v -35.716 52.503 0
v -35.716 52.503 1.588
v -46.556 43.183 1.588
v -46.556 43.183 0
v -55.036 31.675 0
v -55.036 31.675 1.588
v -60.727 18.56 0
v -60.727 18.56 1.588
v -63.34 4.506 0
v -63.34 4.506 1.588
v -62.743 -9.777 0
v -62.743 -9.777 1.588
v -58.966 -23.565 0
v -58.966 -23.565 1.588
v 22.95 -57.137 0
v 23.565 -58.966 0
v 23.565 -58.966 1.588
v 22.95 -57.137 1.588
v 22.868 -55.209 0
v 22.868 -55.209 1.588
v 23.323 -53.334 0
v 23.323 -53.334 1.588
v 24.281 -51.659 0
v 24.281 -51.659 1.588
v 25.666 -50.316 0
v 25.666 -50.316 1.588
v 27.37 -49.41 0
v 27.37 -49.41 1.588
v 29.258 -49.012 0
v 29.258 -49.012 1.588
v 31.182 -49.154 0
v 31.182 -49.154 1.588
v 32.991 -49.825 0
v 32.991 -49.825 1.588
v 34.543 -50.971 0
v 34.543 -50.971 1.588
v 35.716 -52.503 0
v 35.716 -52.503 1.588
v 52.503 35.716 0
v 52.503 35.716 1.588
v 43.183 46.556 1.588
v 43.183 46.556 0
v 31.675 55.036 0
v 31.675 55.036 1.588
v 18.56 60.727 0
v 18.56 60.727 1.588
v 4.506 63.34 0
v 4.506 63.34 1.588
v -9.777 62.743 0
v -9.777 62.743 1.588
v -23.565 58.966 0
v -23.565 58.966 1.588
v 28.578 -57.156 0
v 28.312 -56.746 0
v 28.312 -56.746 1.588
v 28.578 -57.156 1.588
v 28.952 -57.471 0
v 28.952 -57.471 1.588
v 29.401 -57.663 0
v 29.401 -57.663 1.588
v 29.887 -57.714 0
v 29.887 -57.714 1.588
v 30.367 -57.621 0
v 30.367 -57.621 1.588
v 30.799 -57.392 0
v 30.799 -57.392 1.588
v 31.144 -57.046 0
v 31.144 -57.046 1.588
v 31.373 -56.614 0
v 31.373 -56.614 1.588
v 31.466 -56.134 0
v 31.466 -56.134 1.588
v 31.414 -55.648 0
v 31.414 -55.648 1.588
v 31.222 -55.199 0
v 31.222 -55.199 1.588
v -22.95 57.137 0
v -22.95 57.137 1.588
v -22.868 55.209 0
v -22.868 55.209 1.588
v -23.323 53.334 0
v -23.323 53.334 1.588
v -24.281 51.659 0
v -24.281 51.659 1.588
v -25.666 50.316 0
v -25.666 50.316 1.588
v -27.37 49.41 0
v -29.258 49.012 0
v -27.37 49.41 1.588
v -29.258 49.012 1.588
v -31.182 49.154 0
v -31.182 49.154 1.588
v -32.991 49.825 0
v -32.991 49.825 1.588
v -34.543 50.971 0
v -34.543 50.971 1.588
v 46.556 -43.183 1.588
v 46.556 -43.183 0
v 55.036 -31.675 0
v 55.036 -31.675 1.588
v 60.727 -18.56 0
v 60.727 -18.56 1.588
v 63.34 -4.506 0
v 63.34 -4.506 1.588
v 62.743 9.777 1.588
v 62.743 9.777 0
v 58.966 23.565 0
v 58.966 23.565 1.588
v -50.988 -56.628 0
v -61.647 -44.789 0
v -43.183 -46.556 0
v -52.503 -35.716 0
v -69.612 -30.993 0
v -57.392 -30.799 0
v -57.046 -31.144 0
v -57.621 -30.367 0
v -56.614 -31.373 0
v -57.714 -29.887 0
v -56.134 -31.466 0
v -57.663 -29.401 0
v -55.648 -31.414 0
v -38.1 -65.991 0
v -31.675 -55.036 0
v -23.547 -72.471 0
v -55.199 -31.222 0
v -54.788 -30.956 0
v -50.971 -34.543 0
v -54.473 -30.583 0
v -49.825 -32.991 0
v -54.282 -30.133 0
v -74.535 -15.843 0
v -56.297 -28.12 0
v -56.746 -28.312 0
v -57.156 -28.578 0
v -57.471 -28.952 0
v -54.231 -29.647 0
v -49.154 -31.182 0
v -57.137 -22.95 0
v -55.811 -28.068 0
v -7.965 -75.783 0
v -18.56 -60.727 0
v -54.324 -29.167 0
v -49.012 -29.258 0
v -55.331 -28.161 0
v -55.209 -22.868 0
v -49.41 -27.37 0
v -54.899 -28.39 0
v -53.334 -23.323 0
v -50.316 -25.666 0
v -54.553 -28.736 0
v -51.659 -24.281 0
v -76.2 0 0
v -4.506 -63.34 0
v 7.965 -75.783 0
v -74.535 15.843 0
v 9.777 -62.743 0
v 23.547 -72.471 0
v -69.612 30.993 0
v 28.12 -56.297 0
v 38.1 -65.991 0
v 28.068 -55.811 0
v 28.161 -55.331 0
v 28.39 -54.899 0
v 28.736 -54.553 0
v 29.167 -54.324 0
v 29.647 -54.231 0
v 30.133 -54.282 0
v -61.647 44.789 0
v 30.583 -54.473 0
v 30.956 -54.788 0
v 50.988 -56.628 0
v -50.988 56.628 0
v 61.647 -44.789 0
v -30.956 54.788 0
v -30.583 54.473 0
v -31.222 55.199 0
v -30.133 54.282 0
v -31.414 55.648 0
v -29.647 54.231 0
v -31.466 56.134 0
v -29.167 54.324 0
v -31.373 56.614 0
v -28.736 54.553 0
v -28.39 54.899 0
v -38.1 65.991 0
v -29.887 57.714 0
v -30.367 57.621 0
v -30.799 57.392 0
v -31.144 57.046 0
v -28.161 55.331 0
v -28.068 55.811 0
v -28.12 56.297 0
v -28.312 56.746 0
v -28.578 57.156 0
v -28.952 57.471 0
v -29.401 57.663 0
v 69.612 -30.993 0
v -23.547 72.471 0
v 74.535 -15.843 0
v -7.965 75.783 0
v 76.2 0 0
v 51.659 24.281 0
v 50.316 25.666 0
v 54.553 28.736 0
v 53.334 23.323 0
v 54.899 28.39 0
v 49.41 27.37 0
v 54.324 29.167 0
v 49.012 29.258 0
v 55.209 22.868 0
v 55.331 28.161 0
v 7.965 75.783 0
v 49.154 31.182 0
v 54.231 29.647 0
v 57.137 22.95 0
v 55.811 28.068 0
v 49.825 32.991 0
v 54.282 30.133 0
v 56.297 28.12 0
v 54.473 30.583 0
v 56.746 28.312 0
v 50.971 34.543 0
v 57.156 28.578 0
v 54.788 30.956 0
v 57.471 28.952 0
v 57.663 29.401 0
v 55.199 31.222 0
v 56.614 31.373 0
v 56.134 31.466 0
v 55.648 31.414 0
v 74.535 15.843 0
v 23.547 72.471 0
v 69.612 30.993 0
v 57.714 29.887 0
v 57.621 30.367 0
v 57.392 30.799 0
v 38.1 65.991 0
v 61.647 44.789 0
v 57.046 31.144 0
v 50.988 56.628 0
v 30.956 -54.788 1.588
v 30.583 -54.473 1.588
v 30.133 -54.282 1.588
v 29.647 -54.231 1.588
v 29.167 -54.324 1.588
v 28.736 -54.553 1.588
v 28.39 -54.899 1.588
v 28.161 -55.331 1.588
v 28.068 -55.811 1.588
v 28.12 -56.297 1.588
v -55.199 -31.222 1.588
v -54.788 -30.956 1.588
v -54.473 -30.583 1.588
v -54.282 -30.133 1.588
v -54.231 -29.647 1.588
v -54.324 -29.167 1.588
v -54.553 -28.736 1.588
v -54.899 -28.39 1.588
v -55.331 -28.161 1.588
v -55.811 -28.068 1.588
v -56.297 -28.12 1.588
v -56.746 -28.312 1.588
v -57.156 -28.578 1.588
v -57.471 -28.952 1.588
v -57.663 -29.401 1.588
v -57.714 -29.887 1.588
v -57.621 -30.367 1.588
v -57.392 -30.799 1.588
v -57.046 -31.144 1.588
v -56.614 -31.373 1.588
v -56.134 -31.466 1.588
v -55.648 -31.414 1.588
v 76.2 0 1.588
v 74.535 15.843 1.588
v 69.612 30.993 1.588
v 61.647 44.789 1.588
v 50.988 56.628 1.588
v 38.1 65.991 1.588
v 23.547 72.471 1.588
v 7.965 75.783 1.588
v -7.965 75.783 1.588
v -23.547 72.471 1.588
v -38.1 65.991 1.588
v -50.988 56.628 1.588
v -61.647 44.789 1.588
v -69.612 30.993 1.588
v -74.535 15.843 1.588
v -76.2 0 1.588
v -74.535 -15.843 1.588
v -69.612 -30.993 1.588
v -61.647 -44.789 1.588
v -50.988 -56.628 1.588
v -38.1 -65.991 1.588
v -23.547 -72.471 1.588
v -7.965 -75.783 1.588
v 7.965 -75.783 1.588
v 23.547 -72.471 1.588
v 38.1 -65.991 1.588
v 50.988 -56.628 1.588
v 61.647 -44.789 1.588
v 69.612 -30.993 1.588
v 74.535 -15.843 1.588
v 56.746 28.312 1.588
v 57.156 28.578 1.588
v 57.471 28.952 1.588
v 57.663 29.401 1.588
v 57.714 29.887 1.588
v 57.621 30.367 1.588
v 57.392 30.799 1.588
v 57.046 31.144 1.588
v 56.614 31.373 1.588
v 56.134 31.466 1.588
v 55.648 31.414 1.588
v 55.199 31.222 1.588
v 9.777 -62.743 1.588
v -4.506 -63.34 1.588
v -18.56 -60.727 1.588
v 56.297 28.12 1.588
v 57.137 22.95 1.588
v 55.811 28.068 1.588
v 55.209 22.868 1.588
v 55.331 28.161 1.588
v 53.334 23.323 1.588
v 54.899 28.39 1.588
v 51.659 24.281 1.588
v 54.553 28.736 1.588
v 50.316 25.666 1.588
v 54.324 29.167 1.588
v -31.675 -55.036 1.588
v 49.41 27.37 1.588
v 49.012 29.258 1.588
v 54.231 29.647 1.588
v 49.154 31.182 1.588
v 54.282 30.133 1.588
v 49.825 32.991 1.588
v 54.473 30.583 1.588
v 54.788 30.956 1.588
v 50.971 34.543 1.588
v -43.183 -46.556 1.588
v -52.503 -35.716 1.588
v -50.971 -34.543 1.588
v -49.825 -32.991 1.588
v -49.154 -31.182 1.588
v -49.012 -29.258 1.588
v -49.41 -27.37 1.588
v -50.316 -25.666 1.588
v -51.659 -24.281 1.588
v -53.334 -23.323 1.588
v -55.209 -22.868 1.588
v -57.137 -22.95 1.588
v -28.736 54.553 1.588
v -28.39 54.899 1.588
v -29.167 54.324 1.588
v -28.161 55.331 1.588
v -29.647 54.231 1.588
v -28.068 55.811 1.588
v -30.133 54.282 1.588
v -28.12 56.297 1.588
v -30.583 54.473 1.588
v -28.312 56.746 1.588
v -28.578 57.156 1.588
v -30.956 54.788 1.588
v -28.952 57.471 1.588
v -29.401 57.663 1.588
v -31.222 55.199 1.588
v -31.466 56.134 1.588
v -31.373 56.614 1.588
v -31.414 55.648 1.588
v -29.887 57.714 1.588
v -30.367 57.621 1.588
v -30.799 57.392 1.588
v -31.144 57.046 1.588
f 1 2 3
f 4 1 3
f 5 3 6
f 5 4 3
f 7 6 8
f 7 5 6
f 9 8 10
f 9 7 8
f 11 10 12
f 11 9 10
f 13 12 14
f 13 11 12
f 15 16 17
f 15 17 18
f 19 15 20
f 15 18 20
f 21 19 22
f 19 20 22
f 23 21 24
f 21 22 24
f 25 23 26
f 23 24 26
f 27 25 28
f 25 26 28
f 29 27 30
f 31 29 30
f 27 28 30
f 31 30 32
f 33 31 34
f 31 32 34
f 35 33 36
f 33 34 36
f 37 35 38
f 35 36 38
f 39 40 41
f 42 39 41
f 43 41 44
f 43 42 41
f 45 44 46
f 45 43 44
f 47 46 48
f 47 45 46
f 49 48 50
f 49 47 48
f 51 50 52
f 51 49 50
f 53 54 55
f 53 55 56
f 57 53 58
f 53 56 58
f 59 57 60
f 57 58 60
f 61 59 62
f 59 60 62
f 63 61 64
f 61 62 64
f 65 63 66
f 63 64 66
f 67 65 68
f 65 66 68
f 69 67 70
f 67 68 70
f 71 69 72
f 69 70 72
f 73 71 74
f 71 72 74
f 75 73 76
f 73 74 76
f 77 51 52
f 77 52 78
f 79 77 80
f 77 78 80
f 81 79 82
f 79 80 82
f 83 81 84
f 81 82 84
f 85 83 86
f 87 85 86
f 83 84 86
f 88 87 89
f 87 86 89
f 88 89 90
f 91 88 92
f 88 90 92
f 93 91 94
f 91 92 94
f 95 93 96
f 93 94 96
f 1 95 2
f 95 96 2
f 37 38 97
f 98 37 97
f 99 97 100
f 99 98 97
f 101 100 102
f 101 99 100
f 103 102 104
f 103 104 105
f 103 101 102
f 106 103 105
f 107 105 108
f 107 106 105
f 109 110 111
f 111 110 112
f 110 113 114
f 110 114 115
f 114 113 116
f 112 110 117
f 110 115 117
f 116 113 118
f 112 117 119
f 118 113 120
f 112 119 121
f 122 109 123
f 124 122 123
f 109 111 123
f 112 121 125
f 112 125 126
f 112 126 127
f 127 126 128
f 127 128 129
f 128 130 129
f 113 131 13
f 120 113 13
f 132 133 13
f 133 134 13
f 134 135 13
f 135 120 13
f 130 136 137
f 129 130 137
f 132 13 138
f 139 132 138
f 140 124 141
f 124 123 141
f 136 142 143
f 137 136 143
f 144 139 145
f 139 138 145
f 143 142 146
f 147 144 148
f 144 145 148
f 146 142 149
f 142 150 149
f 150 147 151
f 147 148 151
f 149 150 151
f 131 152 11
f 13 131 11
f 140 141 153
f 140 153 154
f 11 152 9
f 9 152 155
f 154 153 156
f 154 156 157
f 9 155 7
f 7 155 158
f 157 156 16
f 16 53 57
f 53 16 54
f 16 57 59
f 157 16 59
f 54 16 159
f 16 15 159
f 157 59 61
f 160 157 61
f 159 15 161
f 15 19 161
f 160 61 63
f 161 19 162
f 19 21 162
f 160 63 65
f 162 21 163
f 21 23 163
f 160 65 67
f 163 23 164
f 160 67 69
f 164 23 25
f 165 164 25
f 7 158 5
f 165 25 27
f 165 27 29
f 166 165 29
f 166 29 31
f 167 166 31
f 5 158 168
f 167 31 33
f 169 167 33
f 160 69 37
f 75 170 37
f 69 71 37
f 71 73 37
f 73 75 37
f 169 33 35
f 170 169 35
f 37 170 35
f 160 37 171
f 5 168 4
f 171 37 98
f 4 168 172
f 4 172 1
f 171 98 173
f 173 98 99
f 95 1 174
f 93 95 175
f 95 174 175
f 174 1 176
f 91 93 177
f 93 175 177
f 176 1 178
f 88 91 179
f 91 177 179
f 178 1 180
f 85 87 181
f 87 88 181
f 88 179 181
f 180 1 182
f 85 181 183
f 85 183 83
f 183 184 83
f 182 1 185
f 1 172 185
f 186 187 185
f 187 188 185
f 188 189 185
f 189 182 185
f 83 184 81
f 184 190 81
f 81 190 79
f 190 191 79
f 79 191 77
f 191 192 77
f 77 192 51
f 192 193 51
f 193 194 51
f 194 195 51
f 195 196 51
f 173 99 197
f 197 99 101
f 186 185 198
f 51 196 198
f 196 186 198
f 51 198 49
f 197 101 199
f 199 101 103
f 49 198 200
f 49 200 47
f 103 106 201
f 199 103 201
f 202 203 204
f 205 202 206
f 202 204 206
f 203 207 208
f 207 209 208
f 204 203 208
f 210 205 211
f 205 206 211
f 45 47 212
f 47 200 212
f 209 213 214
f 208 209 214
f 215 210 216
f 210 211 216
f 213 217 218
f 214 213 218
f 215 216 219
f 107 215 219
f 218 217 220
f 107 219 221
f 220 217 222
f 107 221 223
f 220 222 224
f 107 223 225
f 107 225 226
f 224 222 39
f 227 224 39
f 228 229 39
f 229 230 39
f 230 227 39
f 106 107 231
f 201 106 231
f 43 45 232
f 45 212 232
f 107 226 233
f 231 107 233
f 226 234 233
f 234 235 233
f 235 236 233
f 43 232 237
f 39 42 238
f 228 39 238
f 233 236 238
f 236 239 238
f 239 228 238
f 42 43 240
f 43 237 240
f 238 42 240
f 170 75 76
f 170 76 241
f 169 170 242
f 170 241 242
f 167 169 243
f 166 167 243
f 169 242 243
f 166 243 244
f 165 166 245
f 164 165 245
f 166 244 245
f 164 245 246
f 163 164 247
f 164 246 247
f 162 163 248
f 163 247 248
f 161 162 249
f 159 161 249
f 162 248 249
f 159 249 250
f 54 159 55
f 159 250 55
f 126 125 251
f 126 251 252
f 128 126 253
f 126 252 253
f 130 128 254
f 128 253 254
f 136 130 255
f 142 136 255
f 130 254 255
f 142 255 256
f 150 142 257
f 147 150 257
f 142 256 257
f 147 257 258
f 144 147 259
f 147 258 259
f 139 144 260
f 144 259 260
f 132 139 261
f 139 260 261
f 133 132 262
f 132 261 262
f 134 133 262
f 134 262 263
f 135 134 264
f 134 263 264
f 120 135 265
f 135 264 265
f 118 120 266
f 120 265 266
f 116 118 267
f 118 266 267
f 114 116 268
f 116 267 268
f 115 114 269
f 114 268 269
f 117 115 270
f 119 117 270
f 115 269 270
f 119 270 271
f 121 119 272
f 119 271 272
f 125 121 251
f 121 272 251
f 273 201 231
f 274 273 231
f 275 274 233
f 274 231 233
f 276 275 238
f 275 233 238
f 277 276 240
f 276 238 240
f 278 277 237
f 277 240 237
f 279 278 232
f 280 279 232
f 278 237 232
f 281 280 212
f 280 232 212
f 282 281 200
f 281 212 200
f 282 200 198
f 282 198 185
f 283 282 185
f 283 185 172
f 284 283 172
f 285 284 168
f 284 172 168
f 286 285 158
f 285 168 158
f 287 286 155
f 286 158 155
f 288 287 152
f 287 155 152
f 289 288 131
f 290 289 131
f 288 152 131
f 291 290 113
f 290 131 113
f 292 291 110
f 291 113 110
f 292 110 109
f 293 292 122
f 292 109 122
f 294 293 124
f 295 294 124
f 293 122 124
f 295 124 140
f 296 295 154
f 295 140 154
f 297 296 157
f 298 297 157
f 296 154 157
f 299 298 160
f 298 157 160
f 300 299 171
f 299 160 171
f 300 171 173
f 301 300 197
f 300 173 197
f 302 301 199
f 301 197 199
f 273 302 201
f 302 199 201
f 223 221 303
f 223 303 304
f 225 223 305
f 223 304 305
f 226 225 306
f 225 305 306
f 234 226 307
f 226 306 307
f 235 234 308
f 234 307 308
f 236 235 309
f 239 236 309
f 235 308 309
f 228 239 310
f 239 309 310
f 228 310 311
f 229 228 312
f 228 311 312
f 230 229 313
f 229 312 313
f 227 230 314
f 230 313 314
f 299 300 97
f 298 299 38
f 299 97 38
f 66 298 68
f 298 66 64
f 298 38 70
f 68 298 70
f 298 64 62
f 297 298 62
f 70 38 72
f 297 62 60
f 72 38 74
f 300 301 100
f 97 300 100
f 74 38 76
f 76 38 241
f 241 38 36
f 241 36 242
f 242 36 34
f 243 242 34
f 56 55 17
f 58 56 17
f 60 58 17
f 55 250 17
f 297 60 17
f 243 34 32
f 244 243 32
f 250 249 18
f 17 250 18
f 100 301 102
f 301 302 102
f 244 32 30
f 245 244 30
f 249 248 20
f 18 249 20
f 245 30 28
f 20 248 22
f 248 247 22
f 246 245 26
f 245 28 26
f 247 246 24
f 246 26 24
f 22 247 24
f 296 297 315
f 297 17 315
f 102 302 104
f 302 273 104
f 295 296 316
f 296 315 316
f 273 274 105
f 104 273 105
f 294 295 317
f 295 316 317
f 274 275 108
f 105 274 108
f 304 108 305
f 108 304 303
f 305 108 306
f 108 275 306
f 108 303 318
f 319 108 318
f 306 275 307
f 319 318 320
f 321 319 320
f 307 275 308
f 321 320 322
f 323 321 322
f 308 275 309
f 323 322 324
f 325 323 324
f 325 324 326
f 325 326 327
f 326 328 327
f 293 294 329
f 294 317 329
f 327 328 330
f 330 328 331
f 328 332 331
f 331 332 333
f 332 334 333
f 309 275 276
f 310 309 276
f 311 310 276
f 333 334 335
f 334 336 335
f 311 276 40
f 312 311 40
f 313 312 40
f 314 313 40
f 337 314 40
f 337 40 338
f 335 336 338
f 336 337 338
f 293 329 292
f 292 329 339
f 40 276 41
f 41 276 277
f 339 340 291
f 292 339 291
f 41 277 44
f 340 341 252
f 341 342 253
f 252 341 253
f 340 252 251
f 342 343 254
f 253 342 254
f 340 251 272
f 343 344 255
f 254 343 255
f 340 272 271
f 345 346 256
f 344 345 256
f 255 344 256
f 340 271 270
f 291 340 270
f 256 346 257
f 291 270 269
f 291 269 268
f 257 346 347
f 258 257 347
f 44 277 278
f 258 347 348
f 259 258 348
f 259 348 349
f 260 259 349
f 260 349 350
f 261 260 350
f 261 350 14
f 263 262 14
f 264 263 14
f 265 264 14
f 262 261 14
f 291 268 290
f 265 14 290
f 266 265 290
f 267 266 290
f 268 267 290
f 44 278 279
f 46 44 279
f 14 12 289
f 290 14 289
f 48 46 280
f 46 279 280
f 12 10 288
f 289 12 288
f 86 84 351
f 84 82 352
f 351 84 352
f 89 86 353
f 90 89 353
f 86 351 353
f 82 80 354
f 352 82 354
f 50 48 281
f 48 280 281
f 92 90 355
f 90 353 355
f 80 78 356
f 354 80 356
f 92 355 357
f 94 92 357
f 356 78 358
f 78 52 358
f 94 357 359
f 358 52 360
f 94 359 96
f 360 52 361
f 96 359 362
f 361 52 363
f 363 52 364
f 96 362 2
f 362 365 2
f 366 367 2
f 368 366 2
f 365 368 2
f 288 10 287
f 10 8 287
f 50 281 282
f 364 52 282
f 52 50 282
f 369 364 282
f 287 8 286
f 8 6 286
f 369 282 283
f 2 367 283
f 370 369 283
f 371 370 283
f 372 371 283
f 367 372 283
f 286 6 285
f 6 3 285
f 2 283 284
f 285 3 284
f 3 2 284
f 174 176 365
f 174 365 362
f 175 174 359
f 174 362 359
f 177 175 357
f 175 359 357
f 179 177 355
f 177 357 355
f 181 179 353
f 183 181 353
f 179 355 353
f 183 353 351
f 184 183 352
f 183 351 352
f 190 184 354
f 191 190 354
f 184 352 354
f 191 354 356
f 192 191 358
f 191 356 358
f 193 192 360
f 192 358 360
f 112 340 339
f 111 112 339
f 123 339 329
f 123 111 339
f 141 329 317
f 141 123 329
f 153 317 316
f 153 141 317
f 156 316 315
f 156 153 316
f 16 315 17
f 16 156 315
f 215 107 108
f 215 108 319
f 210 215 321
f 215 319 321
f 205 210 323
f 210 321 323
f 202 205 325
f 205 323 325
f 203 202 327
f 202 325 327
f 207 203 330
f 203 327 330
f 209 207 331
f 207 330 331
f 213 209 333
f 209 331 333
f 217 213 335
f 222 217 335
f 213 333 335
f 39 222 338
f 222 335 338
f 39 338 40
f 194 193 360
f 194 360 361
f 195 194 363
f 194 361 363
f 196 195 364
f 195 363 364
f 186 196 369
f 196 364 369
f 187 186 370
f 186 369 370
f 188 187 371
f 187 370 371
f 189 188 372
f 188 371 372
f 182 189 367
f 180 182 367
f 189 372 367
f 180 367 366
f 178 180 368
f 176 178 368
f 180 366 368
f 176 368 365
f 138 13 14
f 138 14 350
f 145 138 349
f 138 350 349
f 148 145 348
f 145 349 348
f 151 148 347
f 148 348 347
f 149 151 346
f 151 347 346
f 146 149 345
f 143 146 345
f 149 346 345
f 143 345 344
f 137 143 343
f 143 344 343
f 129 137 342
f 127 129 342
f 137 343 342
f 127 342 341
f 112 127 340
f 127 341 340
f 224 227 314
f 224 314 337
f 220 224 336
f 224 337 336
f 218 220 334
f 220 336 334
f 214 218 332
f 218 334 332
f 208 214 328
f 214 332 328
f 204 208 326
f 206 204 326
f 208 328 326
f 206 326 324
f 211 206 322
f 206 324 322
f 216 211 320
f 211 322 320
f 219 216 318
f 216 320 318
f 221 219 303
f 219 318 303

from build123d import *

# Parameters (mm, degrees)
SKETCH1_R           = 76.2
SKETCH1_R_2         = 63.5
BOSS_EXTRUDE1_DEPTH = 1.5875
SKETCH2_R           = 1.651
BOSS_EXTRUDE2_DEPTH = 1.5875
SKETCH4_R           = 1.651
CUT_EXTRUDE2_DEPTH  = 1.5875
CIRPATTERN2_COUNT   = 4
CIRPATTERN3_COUNT   = 4


with BuildPart() as part:
    # Sketch1 → Boss-Extrude1 (new body)
    with BuildSketch(Plane.XY):
        Circle(SKETCH1_R)
        Circle(SKETCH1_R_2, mode=Mode.SUBTRACT)
    extrude(amount=BOSS_EXTRUDE1_DEPTH)

    # Sketch2 → Boss-Extrude2 (add)
    with BuildSketch(Plane.XY.offset(1.5875)):
        with BuildLine():
            Line((-36.496083221, 54.681087122), (-25.299953382, 61.158320597))
            ThreePointArc((-25.299953382, 61.158320597), (-26.271105519, 49.921919547), (-36.496083221, 54.681087122))
        make_face()
        with Locations((-29.718, 55.88)):
            Circle(SKETCH2_R, mode=Mode.SUBTRACT)
    boss_extrude2 = extrude(amount=-BOSS_EXTRUDE2_DEPTH)

    # Sketch4 → Cut-Extrude2 (cut)
    with BuildSketch(Plane.XY.offset(1.5875)):
        with Locations((-29.81619736, 56.064644608)):
            Circle(SKETCH4_R)
    cut_extrude2 = extrude(amount=-CUT_EXTRUDE2_DEPTH, mode=Mode.SUBTRACT)

    # CirPattern2: Boss-Extrude2 ×4 about axis
    cirpattern2_axis = Axis((0, 0, 0), (0, 0, 1))
    for i in range(1, CIRPATTERN2_COUNT):
        add(boss_extrude2.rotate(cirpattern2_axis, i * 360 / CIRPATTERN2_COUNT))

    # CirPattern3: Cut-Extrude2 ×4 about axis
    cirpattern3_axis = Axis((0, 0, 0), (0, 0, 1))
    for i in range(1, CIRPATTERN3_COUNT):
        add(cut_extrude2.rotate(cirpattern3_axis, i * 360 / CIRPATTERN3_COUNT), mode=Mode.SUBTRACT)


solid = part.part
